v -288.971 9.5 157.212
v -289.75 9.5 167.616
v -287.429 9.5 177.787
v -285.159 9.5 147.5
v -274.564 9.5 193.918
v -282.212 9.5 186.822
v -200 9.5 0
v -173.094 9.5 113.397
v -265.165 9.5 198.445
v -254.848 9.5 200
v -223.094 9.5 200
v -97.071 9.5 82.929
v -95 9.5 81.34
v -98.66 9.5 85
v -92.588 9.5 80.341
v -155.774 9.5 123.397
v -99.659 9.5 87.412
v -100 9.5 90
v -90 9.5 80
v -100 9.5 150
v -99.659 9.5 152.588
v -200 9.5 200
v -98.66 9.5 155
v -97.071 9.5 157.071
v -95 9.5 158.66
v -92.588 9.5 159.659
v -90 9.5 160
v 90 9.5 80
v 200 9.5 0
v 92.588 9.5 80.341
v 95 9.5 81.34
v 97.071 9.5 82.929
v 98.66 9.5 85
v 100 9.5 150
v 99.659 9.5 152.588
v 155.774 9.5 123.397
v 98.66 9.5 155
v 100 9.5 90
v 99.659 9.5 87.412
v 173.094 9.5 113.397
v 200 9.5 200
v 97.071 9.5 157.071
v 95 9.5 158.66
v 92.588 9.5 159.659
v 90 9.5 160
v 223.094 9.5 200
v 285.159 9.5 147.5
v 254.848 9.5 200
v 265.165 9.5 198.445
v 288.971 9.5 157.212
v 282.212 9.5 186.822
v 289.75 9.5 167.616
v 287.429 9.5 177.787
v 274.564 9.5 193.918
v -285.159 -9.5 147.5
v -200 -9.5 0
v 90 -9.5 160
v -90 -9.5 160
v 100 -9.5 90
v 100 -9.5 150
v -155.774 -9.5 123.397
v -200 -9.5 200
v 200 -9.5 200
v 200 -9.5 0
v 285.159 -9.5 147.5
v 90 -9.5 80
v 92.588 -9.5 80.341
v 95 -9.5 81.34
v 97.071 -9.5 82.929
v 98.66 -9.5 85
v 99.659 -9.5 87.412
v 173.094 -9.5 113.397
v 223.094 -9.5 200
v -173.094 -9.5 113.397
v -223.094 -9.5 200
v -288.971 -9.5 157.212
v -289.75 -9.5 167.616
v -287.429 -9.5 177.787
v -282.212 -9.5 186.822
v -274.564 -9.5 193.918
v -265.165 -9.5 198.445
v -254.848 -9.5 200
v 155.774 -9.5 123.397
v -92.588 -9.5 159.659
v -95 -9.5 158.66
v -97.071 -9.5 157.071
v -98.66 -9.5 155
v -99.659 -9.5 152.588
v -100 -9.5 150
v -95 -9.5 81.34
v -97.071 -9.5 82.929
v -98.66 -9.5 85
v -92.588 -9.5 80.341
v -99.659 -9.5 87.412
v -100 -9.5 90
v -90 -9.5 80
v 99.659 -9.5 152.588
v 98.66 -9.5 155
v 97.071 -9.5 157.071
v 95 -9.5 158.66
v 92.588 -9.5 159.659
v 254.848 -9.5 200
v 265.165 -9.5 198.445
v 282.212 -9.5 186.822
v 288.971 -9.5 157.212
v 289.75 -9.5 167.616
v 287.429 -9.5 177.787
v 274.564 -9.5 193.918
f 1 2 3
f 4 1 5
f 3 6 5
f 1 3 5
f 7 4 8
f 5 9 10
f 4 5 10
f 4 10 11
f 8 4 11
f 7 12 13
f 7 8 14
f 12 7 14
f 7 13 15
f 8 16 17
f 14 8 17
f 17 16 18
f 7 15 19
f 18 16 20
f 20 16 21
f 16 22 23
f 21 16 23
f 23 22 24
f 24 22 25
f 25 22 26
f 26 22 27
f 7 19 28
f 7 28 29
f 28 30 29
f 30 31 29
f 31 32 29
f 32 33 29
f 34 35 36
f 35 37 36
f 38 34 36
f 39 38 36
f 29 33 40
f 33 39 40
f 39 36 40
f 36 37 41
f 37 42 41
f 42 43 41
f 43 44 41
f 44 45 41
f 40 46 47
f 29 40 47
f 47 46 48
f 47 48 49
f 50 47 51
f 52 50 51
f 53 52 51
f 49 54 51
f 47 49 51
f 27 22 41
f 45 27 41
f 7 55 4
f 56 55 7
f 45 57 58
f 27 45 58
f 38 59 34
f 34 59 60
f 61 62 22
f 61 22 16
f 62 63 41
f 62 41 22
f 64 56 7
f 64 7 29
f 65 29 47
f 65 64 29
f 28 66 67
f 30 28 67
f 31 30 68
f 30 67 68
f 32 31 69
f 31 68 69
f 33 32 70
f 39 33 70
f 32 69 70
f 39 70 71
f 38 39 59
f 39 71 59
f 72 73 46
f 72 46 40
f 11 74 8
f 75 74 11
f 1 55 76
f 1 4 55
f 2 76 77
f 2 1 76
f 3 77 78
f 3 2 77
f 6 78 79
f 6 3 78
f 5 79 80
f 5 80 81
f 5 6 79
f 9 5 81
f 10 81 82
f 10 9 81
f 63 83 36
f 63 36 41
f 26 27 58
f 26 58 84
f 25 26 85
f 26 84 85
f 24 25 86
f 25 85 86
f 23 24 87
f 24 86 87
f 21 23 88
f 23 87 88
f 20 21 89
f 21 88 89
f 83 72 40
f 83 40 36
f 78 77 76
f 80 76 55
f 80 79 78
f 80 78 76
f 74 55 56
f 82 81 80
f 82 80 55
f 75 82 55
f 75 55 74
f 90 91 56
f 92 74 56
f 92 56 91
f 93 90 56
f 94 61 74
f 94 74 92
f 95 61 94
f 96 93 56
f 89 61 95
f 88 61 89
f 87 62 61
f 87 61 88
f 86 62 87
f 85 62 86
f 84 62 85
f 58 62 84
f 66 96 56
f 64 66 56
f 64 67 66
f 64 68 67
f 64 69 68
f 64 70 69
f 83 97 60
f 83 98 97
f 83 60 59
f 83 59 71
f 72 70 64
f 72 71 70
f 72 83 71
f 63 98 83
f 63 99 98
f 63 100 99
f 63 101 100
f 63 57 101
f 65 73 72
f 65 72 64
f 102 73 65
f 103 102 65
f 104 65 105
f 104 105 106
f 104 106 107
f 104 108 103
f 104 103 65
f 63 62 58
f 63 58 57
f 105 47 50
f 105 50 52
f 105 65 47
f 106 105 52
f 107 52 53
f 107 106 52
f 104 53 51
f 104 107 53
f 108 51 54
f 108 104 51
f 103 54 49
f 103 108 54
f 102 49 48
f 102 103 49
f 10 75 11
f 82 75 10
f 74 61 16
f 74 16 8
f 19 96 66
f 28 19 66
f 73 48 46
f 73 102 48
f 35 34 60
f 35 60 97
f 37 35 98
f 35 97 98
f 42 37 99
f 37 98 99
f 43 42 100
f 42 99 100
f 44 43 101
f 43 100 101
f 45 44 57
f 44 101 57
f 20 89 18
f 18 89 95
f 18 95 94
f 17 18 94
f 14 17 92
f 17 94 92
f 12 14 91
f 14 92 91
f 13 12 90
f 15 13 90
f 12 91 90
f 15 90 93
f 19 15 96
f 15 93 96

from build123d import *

# Parameters (mm, degrees)
F1_DEPTH = 9.5
F3_DEPTH = 25
F4_R     = 35


with BuildPart() as f1:
    # F0 (on Front) → F1 (new body, symmetric)
    with BuildSketch(Plane.XZ):
        Polygon((-315.4700538379, 200), (-200, 0), (200, 0), (315.4700538379, 200), (223.0940107676, 200), (173.0940107676, 113.3974596216), (155.7735026919, 123.3974596216), (200, 200), (-200, 200), (-155.7735026919, 123.3974596216), (-173.0940107676, 113.3974596216), (-223.0940107676, 200), align=None)
    extrude(amount=F1_DEPTH, both=True)

    # F2 (on face) → F3 (cut)
    with BuildSketch(Plane.XZ.offset(9.5)):
        with BuildLine():
            Line((90, 160), (-90, 160))
            ThreePointArc((-90, 160), (-97.0710678119, 157.0710678119), (-100, 150))
            Line((-100, 150), (-100, 90))
            ThreePointArc((-100, 90), (-97.0710678119, 82.9289321881), (-90, 80))
            Line((-90, 80), (90, 80))
            ThreePointArc((90, 80), (97.0710678119, 82.9289321881), (100, 90))
            Line((100, 90), (100, 150))
            ThreePointArc((100, 150), (97.0710678119, 157.0710678119), (90, 160))
        make_face()
    extrude(amount=-F3_DEPTH, mode=Mode.SUBTRACT)

    # F4
    f4_edges = [f1.edges().sort_by_distance(p)[0] for p in [
        (-315.470054, 0, 200),
        (315.470054, 0, 200),
    ]]
    fillet(f4_edges, radius=F4_R)


solid = f1.part
